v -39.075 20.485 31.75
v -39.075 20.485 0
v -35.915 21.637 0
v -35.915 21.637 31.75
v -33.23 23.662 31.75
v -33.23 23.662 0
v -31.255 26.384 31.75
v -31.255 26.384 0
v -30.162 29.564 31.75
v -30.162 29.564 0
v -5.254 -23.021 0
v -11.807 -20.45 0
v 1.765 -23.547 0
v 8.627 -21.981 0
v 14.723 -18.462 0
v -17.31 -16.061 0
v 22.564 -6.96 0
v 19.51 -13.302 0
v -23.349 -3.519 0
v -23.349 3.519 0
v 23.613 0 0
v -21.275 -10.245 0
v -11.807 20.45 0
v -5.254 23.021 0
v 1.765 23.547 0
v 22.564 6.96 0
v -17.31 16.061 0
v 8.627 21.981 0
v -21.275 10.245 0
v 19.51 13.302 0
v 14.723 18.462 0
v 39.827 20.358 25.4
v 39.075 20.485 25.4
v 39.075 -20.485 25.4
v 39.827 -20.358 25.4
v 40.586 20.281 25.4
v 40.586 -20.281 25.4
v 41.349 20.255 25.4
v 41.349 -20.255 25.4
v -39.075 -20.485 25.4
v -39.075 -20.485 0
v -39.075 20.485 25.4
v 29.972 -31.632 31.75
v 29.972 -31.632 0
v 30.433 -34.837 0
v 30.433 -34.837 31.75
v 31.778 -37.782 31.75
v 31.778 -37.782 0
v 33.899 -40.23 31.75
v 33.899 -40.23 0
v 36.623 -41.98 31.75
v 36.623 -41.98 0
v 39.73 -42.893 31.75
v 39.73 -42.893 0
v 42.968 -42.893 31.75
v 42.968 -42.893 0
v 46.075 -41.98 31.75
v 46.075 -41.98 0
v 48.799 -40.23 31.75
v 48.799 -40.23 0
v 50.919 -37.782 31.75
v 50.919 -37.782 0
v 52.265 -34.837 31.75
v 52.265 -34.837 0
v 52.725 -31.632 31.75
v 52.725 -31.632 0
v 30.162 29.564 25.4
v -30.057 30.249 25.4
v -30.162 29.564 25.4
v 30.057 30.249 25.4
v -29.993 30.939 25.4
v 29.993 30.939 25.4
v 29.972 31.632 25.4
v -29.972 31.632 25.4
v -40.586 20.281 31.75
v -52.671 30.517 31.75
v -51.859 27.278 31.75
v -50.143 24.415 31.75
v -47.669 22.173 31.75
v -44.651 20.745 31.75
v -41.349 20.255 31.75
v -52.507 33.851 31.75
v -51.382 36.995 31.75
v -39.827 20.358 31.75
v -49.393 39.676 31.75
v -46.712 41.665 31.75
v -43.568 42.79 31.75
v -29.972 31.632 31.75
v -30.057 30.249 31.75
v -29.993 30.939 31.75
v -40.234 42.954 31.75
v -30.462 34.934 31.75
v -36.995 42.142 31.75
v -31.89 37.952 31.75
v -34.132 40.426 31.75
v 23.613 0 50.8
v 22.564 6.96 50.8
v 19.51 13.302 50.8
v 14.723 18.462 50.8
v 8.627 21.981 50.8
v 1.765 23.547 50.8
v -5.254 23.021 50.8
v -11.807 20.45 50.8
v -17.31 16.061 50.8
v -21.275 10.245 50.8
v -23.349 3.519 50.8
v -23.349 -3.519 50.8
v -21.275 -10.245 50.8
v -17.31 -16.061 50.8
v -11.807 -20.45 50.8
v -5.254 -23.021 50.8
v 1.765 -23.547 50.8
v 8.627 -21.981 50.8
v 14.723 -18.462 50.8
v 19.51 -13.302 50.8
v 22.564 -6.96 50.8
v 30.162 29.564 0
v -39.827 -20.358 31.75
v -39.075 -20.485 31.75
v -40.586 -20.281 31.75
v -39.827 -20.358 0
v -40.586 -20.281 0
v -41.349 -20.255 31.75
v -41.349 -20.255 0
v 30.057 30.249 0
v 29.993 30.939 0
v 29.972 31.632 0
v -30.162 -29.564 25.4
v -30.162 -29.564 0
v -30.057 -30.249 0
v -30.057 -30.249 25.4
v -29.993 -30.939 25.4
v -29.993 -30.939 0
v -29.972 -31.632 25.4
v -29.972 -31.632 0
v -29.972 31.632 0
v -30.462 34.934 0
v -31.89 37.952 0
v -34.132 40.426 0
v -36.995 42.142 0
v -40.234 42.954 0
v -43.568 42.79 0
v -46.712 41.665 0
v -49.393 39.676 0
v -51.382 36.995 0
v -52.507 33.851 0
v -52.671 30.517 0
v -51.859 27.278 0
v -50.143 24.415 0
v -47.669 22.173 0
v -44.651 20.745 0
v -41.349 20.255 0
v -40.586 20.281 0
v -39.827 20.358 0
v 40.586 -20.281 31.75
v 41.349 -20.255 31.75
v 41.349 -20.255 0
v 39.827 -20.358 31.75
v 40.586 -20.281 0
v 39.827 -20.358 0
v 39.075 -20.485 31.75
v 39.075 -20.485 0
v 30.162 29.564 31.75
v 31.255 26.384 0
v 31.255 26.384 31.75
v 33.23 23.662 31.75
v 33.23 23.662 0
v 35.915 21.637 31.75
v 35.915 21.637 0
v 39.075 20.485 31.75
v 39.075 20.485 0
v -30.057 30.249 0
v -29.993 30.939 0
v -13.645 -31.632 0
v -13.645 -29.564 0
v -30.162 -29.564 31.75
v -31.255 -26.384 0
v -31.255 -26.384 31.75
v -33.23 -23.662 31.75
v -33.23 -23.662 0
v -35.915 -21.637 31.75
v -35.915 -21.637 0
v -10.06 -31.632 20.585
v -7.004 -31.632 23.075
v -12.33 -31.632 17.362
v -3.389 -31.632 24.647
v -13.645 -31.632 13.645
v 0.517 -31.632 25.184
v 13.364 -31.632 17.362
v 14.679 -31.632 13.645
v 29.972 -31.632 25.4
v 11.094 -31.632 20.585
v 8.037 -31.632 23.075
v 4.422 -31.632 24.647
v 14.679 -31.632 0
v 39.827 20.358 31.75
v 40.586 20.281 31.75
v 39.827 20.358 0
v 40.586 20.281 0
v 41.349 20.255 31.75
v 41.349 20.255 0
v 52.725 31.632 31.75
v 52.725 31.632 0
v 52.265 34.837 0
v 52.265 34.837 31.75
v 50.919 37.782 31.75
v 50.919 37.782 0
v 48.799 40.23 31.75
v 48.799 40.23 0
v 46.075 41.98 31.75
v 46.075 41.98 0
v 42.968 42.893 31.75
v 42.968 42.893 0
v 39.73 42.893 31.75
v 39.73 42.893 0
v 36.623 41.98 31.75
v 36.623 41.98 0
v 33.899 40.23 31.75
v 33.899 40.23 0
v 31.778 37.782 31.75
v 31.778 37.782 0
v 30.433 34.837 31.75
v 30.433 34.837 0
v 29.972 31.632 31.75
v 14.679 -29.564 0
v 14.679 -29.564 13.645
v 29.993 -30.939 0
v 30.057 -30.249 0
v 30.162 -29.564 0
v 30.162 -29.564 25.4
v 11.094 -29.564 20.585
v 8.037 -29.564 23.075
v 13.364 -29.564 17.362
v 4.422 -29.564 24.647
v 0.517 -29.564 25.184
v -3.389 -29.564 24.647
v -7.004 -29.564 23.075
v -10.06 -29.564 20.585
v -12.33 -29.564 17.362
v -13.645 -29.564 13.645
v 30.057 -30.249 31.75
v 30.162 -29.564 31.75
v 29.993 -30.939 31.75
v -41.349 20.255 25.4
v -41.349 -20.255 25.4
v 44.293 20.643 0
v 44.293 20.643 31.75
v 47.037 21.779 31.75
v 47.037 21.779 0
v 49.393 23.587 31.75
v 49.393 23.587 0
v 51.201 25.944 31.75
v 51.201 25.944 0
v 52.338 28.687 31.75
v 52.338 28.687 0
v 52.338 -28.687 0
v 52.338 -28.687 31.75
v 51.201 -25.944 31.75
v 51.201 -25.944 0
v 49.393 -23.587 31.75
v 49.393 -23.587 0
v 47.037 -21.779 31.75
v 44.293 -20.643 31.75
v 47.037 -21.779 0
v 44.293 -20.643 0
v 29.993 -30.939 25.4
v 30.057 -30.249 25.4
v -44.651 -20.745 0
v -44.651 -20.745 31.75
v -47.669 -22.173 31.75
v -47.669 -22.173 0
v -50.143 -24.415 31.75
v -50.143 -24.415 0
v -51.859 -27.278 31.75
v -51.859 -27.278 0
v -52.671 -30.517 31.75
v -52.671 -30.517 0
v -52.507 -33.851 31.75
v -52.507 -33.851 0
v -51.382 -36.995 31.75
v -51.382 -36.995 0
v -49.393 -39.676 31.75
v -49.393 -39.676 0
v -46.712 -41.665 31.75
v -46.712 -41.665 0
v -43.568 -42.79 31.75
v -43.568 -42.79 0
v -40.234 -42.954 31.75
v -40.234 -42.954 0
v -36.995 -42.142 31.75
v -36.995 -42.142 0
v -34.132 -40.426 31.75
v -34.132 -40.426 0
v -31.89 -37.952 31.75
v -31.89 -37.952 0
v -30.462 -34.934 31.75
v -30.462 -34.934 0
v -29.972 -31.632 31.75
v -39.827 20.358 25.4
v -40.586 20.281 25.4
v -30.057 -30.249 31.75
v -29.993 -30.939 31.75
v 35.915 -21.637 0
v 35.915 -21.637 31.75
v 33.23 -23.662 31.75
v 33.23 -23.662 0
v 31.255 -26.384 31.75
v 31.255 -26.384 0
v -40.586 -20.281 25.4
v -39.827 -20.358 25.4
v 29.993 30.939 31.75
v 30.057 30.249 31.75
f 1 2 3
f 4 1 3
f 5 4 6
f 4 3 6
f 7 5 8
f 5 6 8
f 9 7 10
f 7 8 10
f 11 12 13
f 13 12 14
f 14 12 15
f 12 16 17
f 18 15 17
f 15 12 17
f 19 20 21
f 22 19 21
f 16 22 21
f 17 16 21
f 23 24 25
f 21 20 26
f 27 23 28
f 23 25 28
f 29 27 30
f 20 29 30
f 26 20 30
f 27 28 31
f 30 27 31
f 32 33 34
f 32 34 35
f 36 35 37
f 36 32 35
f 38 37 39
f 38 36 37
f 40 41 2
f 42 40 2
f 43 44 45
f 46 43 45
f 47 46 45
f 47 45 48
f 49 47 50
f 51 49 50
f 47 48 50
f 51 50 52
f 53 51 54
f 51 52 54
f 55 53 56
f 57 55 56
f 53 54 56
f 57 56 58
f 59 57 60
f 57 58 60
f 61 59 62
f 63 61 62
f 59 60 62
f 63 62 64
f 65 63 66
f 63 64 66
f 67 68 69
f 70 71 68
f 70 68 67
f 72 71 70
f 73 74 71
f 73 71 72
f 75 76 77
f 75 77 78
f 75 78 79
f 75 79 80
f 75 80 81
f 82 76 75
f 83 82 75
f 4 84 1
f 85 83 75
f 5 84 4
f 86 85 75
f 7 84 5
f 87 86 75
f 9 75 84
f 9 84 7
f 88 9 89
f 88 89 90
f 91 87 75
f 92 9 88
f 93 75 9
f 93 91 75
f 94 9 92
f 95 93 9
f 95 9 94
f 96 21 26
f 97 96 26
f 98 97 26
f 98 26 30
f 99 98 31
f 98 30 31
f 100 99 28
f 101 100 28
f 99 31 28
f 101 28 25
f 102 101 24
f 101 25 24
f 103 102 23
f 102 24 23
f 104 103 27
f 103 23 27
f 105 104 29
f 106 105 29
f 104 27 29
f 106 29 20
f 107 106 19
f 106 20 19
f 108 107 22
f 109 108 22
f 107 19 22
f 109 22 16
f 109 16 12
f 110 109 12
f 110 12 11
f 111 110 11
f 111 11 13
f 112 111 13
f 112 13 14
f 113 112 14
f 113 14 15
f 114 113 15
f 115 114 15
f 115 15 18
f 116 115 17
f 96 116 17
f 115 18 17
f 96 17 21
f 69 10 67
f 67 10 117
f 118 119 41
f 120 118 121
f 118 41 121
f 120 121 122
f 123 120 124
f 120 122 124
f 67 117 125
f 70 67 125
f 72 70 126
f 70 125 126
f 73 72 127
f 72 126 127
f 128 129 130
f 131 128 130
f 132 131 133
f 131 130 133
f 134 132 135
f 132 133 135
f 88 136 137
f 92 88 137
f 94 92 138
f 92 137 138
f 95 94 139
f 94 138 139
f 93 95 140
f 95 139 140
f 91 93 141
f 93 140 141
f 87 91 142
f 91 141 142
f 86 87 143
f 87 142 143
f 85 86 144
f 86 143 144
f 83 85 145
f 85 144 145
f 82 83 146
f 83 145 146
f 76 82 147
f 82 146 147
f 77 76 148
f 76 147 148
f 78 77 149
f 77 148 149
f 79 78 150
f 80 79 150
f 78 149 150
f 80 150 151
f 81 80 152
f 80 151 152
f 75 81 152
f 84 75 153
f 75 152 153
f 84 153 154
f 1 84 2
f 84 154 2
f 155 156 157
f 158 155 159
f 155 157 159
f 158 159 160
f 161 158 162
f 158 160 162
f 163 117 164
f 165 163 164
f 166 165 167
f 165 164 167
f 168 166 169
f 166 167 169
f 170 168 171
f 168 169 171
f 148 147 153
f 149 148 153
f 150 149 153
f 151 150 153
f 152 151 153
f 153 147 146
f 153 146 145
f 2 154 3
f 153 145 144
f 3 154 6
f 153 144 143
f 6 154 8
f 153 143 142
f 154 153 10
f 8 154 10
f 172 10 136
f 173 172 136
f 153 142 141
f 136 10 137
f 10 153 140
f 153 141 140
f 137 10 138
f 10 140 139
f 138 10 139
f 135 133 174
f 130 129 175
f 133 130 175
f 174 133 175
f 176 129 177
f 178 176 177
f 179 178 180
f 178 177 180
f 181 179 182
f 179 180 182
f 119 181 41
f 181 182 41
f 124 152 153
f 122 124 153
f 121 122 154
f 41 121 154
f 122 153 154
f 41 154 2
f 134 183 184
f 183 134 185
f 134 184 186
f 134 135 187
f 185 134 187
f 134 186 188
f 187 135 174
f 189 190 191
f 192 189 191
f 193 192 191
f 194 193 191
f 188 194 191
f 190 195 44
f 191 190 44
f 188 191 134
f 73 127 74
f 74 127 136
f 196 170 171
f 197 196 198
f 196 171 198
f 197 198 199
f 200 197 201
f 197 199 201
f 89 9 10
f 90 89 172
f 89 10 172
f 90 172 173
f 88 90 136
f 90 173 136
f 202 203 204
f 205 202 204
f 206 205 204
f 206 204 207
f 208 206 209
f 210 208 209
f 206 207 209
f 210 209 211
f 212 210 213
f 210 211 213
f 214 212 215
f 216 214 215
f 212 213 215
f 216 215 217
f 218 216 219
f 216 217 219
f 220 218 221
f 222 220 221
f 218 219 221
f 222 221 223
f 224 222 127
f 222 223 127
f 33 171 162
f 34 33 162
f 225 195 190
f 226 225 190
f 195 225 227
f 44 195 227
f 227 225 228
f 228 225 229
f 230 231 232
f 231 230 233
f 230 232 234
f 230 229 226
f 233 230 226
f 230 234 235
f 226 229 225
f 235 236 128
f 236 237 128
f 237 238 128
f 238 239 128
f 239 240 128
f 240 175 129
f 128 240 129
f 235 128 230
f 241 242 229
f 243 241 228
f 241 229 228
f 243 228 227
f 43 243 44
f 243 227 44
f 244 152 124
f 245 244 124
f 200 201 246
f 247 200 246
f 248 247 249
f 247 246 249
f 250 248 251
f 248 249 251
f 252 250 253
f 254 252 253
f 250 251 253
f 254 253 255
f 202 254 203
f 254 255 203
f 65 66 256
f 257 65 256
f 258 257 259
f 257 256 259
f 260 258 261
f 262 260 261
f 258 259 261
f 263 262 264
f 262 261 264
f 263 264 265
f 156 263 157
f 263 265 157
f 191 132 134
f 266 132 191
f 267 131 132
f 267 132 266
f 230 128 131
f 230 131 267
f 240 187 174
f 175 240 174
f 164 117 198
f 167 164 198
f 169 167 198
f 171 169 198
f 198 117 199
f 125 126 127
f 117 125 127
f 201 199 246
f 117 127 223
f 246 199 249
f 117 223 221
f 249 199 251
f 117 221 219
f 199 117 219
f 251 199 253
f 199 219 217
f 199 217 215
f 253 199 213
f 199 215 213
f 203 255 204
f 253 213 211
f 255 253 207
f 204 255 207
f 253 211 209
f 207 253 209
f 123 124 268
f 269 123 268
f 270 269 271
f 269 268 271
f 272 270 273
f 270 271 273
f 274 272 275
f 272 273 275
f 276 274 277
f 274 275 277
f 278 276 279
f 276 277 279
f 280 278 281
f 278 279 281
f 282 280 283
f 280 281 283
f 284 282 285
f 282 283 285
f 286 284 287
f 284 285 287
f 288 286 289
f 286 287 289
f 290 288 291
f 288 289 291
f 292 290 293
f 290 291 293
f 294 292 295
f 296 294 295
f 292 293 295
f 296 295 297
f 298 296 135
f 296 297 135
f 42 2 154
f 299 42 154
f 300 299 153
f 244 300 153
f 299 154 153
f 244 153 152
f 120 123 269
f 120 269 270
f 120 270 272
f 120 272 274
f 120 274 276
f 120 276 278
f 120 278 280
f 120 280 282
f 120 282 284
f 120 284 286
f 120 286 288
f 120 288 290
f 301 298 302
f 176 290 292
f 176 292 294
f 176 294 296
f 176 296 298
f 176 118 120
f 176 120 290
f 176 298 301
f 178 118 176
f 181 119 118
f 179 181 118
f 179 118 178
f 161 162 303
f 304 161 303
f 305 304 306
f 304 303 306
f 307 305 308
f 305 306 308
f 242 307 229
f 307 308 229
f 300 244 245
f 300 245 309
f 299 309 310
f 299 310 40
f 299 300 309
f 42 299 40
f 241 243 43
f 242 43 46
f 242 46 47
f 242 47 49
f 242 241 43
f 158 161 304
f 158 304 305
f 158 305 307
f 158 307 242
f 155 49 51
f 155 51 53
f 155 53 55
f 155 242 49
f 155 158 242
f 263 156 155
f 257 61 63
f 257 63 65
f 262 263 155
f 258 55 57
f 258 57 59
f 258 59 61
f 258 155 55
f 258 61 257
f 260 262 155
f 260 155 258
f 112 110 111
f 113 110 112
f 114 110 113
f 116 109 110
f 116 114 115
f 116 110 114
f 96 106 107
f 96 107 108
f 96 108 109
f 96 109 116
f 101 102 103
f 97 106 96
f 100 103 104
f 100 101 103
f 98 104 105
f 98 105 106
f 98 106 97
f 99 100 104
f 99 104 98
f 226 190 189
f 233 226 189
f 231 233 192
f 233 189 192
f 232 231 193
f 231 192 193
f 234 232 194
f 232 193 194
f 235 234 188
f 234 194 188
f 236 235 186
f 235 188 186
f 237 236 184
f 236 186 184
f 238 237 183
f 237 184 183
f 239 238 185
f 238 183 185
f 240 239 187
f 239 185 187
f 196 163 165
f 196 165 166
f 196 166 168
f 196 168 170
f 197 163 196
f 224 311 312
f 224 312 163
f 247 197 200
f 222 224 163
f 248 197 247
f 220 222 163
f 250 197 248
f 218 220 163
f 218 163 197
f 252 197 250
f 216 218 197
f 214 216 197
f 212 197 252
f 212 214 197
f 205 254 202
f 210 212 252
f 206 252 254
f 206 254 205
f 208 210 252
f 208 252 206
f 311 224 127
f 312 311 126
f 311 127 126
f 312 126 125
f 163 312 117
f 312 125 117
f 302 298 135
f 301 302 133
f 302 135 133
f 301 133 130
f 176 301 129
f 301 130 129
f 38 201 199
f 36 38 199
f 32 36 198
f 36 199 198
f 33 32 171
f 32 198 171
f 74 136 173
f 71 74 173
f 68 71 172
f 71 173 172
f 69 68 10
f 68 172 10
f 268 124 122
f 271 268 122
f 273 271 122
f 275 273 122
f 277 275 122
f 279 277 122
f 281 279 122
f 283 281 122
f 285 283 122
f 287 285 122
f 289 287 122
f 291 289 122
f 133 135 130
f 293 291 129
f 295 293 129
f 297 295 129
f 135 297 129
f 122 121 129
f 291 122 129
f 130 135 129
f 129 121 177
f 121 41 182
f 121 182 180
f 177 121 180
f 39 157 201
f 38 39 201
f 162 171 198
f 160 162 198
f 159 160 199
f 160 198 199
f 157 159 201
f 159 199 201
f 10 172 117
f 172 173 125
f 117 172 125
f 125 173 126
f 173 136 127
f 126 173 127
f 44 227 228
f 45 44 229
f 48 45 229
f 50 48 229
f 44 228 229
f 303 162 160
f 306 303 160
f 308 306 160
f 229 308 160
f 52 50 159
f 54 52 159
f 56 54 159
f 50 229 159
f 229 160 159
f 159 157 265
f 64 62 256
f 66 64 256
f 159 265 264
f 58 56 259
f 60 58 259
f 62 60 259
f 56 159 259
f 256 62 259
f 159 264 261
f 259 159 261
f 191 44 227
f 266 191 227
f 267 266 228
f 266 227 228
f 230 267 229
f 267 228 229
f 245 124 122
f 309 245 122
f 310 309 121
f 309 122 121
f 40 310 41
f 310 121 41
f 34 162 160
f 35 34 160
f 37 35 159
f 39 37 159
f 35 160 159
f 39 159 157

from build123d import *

# Parameters (mm, degrees)
F1_DEPTH = 25.4
F2_DEPTH = 31.75
F0_R     = 23.6132270113
F3_DEPTH = 50.8
F5_DEPTH = 41.91


with BuildPart() as f1:
    # F0 (on Top) → F1 (new body)
    with BuildSketch(Plane.XY):
        with BuildLine():
            Line((29.9722703229, 31.631860882), (-29.9722703229, 31.631860882))
            ThreePointArc((-29.9722703229, 31.631860882), (-30.0197276791, 30.5938091569), (-30.161703811, 29.5644178987))
            Line((-30.161703811, 29.5644178987), (30.161703811, 29.5644178987))
            ThreePointArc((30.161703811, 29.5644178987), (30.0197276791, 30.5938091569), (29.9722703229, 31.631860882))
        make_face()
    extrude(amount=F1_DEPTH)


with BuildPart() as f1b:
    # F0 (on Top) → F1, piece 2 (new body)
    with BuildSketch(Plane.XY):
        with BuildLine():
            Line((-41.348837316, 20.2552938889), (-41.348837316, -20.2552938889))
            ThreePointArc((-41.348837316, -20.2552938889), (-40.2059630767, -20.3128452437), (-39.074651897, -20.4849170305))
            Line((-39.074651897, -20.4849170305), (-39.074651897, 20.4849170305))
            ThreePointArc((-39.074651897, 20.4849170305), (-40.2059630767, 20.3128452437), (-41.348837316, 20.2552938889))
        make_face()
    extrude(amount=F1_DEPTH)


with BuildPart() as f1c:
    # F0 (on Top) → F1, piece 3 (new body)
    with BuildSketch(Plane.XY):
        with BuildLine():
            ThreePointArc((-30.161703811, -29.5644178987), (-30.0197276791, -30.5938091569), (-29.9722703229, -31.631860882))
            Line((-29.9722703229, -31.631860882), (29.9722703229, -31.631860882))
            ThreePointArc((29.9722703229, -31.631860882), (30.0197276791, -30.5938091569), (30.161703811, -29.5644178987))
            Line((30.161703811, -29.5644178987), (-30.161703811, -29.5644178987))
        make_face()
    extrude(amount=F1_DEPTH)

    # F4 (on face) → F5 (cut)
    with BuildSketch(Plane.XZ.offset(31.631860882)):
        with BuildLine():
            Line((-13.6451162398, 13.6451171711), (-13.6451162398, 0))
            Line((-13.6451162398, 0), (14.6788377315, 0))
            Line((14.6788377315, 0), (14.6788377315, 13.6451171711))
            ThreePointArc((14.6788377315, 13.6451171711), (0.5168607458, 25.1843783905), (-13.6451162398, 13.6451171711))
        make_face()
    extrude(amount=-F5_DEPTH, mode=Mode.SUBTRACT)


with BuildPart() as f1d:
    # F0 (on Top) → F1, piece 4 (new body)
    with BuildSketch(Plane.XY):
        with BuildLine():
            Line((39.074651897, 20.4849170305), (39.074651897, -20.4849170305))
            ThreePointArc((39.074651897, -20.4849170305), (40.2059630767, -20.3128452437), (41.348837316, -20.2552938889))
            Line((41.348837316, -20.2552938889), (41.348837316, 20.2552938889))
            ThreePointArc((41.348837316, 20.2552938889), (40.2059630767, 20.3128452437), (39.074651897, 20.4849170305))
        make_face()
    extrude(amount=F1_DEPTH)


with BuildPart() as f2:
    # F0 (on Top) → F2 (new body)
    with BuildSketch(Plane.XY):
        with BuildLine():
            ThreePointArc((-29.9722703229, 31.631860882), (-49.3932849835, 39.6763085495), (-41.348837316, 20.2552938889))
            ThreePointArc((-41.348837316, 20.2552938889), (-40.2059630767, 20.3128452437), (-39.074651897, 20.4849170305))
            ThreePointArc((-39.074651897, 20.4849170305), (-33.2302715069, 23.6622206297), (-30.161703811, 29.5644178987))
            ThreePointArc((-30.161703811, 29.5644178987), (-30.0197276791, 30.5938091569), (-29.9722703229, 31.631860882))
        make_face()
    extrude(amount=F2_DEPTH)


with BuildPart() as f2b:
    # F0 (on Top) → F2, piece 2 (new body)
    with BuildSketch(Plane.XY):
        with BuildLine():
            ThreePointArc((-41.348837316, -20.2552938889), (-49.3932849835, -39.6763085495), (-29.9722703229, -31.631860882))
            ThreePointArc((-29.9722703229, -31.631860882), (-30.0197276791, -30.5938091569), (-30.161703811, -29.5644178987))
            ThreePointArc((-30.161703811, -29.5644178987), (-33.2302715069, -23.6622206297), (-39.074651897, -20.4849170305))
            ThreePointArc((-39.074651897, -20.4849170305), (-40.2059630767, -20.3128452437), (-41.348837316, -20.2552938889))
        make_face()
    extrude(amount=F2_DEPTH)


with BuildPart() as f2c:
    # F0 (on Top) → F2, piece 3 (new body)
    with BuildSketch(Plane.XY):
        with BuildLine():
            ThreePointArc((30.161703811, -29.5644178987), (30.0197276791, -30.5938091569), (29.9722703229, -31.631860882))
            ThreePointArc((29.9722703229, -31.631860882), (41.348837316, -43.0084278752), (52.7254043092, -31.631860882))
            ThreePointArc((52.7254043092, -31.631860882), (49.3932849835, -23.5874132146), (41.348837316, -20.2552938889))
            ThreePointArc((41.348837316, -20.2552938889), (40.2059630767, -20.3128452437), (39.074651897, -20.4849170305))
            ThreePointArc((39.074651897, -20.4849170305), (33.2302715069, -23.6622206297), (30.161703811, -29.5644178987))
        make_face()
    extrude(amount=F2_DEPTH)


with BuildPart() as f2d:
    # F0 (on Top) → F2, piece 4 (new body)
    with BuildSketch(Plane.XY):
        with BuildLine():
            ThreePointArc((30.161703811, 29.5644178987), (33.2302715069, 23.6622206297), (39.074651897, 20.4849170305))
            ThreePointArc((39.074651897, 20.4849170305), (40.2059630767, 20.3128452437), (41.348837316, 20.2552938889))
            ThreePointArc((41.348837316, 20.2552938889), (49.3932849835, 23.5874132146), (52.7254043092, 31.631860882))
            ThreePointArc((52.7254043092, 31.631860882), (41.348837316, 43.0084278752), (29.9722703229, 31.631860882))
            ThreePointArc((29.9722703229, 31.631860882), (30.0197276791, 30.5938091569), (30.161703811, 29.5644178987))
        make_face()
    extrude(amount=F2_DEPTH)


with BuildPart() as f3:
    # F0 (on Top) → F3 (new body)
    with BuildSketch(Plane.XY):
        Circle(F0_R)
    extrude(amount=F3_DEPTH)


solid = Compound([f1.part, f1b.part, f1c.part, f1d.part, f2.part, f2b.part, f2c.part, f2d.part, f3.part])
